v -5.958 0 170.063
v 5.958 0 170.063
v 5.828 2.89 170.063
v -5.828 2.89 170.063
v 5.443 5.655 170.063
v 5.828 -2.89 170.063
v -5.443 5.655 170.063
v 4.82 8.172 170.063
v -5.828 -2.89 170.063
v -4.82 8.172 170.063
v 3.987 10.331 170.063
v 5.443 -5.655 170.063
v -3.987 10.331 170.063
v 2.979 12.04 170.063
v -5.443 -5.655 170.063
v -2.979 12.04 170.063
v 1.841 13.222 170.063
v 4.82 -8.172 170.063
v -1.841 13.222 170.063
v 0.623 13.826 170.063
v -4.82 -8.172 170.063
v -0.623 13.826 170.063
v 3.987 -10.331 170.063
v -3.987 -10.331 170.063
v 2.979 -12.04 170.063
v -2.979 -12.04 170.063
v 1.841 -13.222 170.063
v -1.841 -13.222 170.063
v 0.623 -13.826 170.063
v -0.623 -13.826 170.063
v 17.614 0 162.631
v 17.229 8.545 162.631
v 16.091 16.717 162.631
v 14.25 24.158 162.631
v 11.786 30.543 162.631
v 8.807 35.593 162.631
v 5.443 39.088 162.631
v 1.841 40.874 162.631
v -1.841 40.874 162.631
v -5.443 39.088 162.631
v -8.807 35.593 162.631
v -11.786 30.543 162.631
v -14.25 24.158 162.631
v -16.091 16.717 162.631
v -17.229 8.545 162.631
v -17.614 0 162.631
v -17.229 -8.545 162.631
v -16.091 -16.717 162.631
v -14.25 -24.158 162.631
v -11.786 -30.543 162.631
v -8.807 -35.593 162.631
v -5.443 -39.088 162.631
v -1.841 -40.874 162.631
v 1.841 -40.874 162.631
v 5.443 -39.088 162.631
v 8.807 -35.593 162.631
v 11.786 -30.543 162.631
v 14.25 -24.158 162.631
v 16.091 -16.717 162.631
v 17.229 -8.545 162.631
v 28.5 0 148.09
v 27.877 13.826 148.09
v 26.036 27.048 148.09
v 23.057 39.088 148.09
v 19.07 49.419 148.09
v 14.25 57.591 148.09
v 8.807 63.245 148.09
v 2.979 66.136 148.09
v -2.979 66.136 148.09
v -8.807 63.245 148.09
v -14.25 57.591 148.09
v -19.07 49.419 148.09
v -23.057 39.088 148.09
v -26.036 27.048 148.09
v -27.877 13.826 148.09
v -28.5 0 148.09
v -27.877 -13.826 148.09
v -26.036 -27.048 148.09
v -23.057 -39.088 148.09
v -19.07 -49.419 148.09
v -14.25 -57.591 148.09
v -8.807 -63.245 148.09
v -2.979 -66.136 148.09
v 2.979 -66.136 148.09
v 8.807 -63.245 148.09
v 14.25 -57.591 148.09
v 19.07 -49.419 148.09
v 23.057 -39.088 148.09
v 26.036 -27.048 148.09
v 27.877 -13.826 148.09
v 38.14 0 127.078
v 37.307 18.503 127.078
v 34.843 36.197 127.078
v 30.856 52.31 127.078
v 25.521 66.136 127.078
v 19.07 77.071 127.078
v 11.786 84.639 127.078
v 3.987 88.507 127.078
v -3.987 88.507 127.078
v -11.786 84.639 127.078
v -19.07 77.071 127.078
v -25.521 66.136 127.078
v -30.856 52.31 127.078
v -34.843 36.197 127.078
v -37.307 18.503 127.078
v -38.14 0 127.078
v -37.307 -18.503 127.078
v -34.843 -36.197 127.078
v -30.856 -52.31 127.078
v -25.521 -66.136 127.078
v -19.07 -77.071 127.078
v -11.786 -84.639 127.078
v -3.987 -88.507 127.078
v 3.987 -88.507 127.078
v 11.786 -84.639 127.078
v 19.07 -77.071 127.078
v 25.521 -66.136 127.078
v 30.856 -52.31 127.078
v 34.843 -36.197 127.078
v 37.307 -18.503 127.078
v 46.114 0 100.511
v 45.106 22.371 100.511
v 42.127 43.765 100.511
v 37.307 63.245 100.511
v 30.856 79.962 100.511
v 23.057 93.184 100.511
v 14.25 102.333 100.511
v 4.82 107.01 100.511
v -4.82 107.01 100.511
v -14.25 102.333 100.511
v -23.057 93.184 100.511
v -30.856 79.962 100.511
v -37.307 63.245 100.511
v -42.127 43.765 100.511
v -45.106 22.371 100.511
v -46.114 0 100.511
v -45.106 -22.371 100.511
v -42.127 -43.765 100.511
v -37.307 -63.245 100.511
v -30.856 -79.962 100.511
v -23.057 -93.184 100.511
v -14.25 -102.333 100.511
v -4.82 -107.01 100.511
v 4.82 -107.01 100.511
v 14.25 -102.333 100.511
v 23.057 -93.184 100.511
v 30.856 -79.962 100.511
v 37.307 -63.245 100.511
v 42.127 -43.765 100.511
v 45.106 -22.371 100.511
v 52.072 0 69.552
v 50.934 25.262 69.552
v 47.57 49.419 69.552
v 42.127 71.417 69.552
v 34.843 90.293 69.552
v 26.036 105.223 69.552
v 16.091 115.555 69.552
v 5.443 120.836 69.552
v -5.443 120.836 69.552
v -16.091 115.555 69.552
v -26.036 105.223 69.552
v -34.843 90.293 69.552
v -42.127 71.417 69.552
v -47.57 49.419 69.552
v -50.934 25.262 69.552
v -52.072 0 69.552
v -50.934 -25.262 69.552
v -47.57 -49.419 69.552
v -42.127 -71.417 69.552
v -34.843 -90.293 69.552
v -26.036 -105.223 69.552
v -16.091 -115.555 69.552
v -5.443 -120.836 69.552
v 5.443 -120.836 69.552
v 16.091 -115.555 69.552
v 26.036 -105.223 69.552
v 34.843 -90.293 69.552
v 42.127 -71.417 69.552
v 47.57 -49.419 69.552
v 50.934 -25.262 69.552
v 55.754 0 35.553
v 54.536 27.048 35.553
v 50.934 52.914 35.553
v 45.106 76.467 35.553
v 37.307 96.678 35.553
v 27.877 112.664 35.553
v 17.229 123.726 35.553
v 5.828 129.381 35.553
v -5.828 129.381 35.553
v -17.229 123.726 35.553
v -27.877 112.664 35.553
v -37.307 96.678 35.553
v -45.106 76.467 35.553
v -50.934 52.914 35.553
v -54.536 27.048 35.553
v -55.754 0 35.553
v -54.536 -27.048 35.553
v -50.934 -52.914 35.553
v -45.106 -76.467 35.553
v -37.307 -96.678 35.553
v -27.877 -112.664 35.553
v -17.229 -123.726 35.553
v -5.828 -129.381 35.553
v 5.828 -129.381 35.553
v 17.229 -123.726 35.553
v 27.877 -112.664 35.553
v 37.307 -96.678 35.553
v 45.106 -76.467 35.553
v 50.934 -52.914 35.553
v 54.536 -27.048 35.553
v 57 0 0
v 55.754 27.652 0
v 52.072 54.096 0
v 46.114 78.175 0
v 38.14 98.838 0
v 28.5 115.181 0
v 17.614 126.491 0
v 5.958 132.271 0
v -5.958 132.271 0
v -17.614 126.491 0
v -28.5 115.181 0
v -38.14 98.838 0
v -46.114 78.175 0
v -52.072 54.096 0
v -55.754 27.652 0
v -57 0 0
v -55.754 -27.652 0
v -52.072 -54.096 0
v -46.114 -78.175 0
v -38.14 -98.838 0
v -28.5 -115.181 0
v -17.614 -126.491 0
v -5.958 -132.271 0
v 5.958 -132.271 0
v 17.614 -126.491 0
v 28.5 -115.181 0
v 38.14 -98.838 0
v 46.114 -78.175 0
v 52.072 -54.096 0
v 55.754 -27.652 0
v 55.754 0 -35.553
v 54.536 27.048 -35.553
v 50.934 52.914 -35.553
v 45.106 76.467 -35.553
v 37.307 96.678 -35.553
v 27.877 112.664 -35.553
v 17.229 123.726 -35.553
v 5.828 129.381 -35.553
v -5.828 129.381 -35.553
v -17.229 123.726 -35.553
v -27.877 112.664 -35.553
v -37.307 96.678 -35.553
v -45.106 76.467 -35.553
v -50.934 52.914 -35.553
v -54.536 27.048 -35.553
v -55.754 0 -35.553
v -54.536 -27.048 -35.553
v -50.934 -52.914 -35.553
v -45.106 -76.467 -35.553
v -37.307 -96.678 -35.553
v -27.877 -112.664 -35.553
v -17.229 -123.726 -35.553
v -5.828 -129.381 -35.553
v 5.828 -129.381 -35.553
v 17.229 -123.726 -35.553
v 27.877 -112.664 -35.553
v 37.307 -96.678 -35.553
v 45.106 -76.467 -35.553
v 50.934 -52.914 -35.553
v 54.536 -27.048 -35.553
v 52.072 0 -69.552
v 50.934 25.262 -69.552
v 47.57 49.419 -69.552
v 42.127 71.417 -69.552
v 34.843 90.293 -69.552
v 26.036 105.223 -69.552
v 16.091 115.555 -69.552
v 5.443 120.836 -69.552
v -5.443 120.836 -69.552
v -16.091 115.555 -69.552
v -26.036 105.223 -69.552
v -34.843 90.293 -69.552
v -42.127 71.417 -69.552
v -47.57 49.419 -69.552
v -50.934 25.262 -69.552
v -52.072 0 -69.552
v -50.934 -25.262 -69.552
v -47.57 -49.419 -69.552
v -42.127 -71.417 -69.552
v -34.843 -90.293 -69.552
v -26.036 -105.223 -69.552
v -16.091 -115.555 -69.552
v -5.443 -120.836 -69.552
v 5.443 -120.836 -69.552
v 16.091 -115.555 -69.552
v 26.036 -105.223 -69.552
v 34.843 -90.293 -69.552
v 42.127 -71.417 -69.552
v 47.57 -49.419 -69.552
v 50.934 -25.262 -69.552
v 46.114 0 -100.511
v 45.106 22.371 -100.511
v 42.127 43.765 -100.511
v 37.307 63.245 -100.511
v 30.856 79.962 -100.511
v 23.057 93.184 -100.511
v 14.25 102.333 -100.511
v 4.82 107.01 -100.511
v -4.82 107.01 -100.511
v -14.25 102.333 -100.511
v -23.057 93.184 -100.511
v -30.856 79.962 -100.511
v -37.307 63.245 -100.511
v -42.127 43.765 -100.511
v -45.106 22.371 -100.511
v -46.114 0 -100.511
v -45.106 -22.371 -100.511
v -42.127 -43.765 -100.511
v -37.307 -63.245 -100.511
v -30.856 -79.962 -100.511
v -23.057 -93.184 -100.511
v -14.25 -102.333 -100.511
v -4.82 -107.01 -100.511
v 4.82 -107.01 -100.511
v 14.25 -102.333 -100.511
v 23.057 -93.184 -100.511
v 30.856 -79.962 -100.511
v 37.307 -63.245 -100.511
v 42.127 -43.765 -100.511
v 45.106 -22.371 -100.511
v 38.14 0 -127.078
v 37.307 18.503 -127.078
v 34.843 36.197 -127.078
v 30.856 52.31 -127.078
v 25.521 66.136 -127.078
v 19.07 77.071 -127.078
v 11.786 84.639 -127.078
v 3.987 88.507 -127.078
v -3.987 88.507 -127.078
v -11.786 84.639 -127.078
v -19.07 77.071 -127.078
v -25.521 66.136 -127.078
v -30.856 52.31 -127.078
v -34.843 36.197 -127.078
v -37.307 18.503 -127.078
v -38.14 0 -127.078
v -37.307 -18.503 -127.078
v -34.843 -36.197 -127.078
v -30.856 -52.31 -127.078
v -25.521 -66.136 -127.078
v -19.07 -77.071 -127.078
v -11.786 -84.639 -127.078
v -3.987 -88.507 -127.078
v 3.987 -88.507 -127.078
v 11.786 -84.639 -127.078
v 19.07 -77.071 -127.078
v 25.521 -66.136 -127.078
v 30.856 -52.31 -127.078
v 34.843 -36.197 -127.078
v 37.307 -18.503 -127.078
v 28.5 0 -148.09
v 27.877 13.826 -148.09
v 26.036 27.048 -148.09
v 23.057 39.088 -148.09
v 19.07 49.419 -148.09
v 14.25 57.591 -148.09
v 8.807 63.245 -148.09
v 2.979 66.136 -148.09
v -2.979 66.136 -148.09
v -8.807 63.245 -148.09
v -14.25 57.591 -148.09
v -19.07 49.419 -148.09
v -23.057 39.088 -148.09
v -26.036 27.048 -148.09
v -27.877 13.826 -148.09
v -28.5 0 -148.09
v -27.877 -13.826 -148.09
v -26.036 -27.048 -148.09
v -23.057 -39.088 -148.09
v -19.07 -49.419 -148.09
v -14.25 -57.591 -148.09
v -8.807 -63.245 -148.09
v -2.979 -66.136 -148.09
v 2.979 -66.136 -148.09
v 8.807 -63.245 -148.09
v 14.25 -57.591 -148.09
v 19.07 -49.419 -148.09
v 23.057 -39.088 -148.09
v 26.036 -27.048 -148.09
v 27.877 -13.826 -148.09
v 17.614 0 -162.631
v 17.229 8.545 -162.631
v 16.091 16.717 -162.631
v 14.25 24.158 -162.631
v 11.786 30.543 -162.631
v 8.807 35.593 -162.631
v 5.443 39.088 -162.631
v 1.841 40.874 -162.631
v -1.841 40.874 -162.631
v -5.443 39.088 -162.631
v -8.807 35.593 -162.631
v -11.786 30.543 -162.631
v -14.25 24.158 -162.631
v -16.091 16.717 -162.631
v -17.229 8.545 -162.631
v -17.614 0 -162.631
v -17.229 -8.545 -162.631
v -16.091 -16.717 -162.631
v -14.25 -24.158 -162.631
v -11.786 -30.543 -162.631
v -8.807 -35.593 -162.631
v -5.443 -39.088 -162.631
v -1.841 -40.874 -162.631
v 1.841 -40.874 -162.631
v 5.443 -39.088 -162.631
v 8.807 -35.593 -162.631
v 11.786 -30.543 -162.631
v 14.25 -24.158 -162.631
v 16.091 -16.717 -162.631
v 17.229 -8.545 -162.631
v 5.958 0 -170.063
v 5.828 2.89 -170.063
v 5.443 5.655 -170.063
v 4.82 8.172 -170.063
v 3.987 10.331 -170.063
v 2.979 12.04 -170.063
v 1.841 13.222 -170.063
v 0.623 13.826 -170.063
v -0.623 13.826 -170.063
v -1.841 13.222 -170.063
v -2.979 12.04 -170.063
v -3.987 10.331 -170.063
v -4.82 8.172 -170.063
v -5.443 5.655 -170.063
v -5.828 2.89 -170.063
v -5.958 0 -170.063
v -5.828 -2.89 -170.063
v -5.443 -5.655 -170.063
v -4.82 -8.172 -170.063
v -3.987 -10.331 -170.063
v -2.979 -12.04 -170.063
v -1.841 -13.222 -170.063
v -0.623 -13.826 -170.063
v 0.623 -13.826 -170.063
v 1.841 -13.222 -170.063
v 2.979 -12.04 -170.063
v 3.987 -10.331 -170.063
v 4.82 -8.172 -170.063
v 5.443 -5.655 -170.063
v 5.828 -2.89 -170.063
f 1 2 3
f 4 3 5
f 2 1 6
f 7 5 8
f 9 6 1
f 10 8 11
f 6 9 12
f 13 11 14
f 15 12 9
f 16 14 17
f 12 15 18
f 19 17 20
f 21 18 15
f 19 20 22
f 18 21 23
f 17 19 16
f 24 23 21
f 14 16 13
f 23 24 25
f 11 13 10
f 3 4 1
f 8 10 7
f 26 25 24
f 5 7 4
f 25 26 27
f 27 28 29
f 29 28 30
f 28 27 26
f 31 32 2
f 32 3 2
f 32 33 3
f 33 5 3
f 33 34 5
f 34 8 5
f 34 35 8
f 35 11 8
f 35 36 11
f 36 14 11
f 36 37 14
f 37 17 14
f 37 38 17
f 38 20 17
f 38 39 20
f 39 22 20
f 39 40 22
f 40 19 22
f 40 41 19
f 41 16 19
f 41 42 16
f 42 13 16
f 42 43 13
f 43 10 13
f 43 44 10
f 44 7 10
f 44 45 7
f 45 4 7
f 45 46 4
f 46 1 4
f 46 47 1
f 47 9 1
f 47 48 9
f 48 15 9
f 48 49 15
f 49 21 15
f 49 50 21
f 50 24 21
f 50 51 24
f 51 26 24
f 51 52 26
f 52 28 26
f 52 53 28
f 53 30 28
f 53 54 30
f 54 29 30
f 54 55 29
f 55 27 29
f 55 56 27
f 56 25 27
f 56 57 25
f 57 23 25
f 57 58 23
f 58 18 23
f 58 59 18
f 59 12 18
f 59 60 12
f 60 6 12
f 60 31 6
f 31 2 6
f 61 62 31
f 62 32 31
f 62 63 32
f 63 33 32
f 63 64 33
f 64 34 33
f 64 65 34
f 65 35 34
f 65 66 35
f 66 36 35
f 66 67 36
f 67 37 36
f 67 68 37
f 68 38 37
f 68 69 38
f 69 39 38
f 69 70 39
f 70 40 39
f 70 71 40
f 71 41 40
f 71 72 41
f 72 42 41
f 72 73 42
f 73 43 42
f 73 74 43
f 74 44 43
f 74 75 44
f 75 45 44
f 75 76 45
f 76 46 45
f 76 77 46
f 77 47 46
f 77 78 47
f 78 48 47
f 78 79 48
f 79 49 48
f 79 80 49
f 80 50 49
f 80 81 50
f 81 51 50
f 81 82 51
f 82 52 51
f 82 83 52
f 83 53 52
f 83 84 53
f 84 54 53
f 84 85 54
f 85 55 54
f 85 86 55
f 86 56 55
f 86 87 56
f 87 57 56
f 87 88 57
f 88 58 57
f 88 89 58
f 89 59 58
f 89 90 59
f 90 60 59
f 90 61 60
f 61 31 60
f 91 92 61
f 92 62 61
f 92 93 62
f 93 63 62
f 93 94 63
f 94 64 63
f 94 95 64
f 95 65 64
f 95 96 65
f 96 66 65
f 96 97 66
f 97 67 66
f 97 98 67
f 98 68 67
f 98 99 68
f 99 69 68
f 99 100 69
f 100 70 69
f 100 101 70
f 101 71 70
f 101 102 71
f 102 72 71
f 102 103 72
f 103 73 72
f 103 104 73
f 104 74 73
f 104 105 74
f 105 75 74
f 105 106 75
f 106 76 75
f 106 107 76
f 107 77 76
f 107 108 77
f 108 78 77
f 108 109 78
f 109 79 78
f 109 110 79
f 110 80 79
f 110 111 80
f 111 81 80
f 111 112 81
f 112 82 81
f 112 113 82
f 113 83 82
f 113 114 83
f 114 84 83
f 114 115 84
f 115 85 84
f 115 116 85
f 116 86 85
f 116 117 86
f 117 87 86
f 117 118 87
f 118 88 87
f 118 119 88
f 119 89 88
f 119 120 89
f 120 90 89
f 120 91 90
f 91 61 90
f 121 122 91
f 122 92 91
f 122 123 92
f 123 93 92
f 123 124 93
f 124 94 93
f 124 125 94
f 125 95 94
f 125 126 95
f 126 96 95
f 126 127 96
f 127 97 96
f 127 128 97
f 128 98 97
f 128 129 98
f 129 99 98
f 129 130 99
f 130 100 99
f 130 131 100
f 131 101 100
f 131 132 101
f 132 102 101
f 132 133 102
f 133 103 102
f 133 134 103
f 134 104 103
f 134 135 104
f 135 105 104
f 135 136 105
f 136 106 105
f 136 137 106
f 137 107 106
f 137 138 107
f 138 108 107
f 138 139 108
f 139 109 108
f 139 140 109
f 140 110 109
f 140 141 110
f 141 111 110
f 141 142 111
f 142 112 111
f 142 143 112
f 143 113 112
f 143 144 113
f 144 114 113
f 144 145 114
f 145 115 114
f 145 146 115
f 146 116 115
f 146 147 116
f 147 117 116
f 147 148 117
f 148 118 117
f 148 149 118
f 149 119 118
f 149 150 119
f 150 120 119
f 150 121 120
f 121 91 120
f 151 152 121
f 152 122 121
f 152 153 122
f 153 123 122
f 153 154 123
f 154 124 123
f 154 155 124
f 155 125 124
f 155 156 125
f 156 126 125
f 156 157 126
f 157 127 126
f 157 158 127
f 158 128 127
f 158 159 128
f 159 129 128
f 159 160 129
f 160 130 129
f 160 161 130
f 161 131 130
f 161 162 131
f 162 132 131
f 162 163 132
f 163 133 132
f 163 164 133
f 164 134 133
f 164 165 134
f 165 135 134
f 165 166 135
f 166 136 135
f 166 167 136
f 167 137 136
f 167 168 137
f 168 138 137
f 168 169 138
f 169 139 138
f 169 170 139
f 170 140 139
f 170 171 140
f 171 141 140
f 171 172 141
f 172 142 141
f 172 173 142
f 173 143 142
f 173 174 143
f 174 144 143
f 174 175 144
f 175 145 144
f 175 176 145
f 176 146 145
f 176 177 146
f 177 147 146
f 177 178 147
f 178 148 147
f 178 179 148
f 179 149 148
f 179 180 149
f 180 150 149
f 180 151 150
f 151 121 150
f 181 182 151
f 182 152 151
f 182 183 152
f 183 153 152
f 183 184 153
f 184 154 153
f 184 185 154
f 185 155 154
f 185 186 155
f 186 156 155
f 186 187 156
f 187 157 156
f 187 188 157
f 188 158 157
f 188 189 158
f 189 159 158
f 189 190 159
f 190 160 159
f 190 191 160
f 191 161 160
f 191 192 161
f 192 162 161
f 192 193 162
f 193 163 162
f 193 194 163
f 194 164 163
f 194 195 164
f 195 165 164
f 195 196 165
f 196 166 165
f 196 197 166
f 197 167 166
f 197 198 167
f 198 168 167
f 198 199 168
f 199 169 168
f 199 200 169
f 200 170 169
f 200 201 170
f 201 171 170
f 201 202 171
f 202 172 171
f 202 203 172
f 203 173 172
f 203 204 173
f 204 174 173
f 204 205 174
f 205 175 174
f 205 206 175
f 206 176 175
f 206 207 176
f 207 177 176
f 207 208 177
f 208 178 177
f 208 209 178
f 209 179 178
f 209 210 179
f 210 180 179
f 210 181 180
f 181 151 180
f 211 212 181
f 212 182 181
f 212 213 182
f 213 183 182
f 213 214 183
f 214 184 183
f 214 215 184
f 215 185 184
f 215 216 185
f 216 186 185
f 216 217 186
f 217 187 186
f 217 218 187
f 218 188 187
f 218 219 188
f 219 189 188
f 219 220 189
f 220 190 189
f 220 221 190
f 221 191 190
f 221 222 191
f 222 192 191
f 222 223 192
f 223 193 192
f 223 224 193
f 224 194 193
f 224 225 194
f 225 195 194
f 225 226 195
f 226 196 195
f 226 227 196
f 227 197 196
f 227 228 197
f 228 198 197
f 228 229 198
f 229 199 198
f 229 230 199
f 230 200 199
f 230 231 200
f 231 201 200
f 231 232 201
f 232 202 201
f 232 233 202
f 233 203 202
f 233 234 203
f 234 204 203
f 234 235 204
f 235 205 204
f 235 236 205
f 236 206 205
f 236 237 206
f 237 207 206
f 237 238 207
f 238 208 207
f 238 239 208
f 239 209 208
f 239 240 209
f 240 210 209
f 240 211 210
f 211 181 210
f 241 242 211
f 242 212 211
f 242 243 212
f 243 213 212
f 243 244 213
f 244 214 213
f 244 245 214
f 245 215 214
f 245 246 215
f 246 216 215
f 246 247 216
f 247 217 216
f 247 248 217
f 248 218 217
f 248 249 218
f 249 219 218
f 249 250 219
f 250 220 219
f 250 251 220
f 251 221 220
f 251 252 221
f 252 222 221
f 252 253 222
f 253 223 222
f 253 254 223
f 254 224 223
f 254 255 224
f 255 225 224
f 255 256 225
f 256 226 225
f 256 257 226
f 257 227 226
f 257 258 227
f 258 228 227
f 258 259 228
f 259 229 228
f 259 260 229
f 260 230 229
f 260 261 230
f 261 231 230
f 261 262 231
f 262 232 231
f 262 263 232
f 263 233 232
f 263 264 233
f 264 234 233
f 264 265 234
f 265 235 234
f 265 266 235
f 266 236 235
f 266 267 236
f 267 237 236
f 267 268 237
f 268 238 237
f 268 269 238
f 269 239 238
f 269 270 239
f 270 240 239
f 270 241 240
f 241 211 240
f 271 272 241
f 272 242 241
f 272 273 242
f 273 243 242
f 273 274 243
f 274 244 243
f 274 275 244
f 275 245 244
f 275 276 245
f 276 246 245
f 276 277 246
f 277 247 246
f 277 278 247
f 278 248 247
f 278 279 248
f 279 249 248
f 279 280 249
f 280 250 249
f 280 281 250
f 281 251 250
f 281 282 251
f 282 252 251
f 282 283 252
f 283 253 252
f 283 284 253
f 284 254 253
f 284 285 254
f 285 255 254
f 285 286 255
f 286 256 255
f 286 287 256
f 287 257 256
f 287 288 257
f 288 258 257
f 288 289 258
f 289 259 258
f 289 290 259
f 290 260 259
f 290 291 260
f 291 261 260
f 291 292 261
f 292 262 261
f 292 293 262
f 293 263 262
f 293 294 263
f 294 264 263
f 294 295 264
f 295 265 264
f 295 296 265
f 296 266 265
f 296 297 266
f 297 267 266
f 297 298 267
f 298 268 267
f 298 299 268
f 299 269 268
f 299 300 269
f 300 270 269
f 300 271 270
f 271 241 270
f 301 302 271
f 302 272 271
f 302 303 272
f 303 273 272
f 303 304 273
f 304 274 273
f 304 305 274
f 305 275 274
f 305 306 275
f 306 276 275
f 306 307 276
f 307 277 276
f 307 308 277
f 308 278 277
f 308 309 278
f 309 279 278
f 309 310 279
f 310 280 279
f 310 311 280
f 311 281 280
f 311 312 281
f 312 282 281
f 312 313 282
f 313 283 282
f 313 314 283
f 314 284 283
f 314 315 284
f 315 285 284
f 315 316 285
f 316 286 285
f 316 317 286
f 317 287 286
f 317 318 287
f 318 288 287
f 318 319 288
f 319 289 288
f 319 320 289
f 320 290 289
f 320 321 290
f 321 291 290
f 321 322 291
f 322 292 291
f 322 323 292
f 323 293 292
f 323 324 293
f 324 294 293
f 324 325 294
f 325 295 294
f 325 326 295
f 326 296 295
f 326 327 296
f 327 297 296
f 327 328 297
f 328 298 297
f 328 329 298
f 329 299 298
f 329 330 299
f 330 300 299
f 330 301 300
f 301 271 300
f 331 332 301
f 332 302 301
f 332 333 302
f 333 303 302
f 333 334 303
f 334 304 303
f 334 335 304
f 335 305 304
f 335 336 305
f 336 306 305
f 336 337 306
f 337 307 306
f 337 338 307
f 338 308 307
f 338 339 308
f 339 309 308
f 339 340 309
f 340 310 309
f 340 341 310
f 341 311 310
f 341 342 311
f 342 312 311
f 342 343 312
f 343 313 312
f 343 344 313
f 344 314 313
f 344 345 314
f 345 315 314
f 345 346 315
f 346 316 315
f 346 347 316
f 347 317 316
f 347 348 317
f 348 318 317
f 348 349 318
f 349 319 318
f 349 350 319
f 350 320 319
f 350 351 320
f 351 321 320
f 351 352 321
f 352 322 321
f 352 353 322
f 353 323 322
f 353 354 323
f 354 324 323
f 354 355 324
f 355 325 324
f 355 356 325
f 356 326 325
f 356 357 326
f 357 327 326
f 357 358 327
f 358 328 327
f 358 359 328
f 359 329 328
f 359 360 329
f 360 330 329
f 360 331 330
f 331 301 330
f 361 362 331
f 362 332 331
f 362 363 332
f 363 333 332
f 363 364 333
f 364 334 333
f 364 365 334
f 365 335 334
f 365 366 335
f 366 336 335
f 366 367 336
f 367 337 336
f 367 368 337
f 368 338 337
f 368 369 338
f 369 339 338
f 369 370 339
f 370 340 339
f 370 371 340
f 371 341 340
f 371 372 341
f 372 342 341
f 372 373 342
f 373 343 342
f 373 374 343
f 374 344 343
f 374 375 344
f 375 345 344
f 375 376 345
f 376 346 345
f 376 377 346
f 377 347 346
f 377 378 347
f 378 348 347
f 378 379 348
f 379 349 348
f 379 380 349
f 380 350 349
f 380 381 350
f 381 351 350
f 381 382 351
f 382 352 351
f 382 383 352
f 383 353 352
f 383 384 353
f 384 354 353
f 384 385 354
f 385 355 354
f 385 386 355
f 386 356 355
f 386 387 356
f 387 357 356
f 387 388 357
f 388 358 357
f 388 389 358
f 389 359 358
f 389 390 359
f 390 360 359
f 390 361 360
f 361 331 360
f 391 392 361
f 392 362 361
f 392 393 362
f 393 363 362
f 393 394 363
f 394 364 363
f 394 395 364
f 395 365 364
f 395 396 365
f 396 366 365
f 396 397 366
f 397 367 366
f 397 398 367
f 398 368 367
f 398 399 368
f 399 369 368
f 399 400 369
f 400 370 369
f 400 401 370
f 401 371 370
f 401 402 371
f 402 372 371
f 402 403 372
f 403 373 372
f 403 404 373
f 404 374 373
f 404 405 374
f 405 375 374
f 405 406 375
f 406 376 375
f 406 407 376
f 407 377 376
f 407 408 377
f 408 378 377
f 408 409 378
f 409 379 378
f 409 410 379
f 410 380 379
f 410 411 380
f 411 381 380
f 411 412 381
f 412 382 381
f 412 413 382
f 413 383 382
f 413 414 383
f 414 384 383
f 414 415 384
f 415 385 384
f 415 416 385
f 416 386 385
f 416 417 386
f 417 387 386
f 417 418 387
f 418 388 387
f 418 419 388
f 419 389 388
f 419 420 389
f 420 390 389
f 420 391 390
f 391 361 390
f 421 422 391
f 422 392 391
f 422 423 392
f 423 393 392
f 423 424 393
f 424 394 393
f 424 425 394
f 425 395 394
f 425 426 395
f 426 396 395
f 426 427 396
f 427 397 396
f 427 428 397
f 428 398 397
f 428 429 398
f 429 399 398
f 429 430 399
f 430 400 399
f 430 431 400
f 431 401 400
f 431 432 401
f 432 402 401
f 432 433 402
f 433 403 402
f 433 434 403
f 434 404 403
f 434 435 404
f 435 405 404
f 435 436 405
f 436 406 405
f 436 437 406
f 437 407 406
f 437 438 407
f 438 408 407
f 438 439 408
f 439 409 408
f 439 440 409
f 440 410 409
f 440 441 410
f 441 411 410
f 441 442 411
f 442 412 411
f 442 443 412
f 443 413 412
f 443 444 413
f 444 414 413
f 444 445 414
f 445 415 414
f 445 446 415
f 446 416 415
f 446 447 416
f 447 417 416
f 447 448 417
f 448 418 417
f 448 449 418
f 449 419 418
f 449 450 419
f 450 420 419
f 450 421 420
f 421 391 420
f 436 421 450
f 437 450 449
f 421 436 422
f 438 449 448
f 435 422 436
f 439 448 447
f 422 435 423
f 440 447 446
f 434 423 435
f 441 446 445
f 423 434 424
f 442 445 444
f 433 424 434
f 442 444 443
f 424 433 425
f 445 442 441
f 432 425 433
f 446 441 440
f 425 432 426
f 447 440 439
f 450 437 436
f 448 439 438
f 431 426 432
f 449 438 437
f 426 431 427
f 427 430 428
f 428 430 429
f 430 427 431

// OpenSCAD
// Generated by SolidPython 1.0.1 on 2020-07-29 00:39:25


scale(v = [3, 7, 9]) {
	sphere(r = 19);
}
/***********************************************
*********      SolidPython code:      **********
************************************************
 
# import packages: SolidPython
from solid import *
from solid.utils import *
from itertools import chain, combinations


class Resize:

    def __init__(self, scad_file):
        self.scad_file = scad_file
        #self.scad_file = import_scad(scad_file)
        # cone/cylinder param:
        self.r1 = 0
        self.r2 = 0
        self.h = 0
        # rectangular prism param:
        self.w = 0
        self.l = 0
        # ellipse param:
        self.r = 0

    # import OpenScad code (file name corresponds to shape)


    # classify shape + parameters
    def assign(self, param1, param2, param3):
        if self.scad_file == 'cone.scad':
            self.r1 = param1
            self.r2 = param2
            self.h = param3
        elif self.scad_file == 'cylinder.scad':
            self.r1 = param1
            self.r2 = param2
            self.h = param3
        elif self.scad_file == 'rectangularPrism.scad':
            self.h = param1
            self.l = param2
            self.w = param3
        else:
            self.r = param1
            self.h = param2

    # resize parameters
    def iterate(self):
        x = range(3, 20, 2)
        i = 1
        if self.scad_file == 'cone.scad':
            tempList = list(combinations(x, 2))
            for temp in tempList:
                param1 = temp[0]
                param2 = temp[1]
                filepath = 'produced_scad_files/' + 'cone' + str(param1) + '_' + str(param2) + '_' + '.scad'
                scad_render_to_file(cylinder(h=param1, r1=param2, r2=0), filepath)

        elif self.scad_file == 'cylinder.scad':
            tempList = list(combinations(x, 3))
            for temp in tempList:
                param1 = temp[0]
                param2 = temp[1]
                filepath = 'produced_scad_files/' + 'cylinder' + str(param1) + '_' + str(param2) + '_' + '.scad'
                scad_render_to_file(cylinder(h=param1, r1=param2, r2=param2), filepath)

        elif self.scad_file == 'rectangularPrism.scad':
            tempList = list(combinations(x, 3))
            for temp in tempList:
                param1 = temp[0]
                param2 = temp[1]
                param3 = temp[2]
                filepath = 'produced_scad_files/' + 'rectangularPrism' + str(param1) + '_' + str(param2) + '_' + str(
                    param3) + '.scad'
                scad_render_to_file(cube(size=(param1, param2, param3)), filepath)

        elif self.scad_file == 'ellipse.scad':
            tempList = list(combinations(x, 4))
            for temp in tempList:
                param1 = temp[0]
                param2 = temp[1]
                param3 = temp[2]
                param4 = temp[3]
                filepath = 'produced_scad_files/' + 'ellipse' + str(param1) + '_' + str(param2) + '_' + str(param3) + '_' + str(param4) + '.scad'
                scad_render_to_file(scale([param1, param2, param3])(sphere(r=param4)), filepath)

    def render_to_scadfile(self):
        scad_render_to_file(scad, 'example.scad') 
 
************************************************/
